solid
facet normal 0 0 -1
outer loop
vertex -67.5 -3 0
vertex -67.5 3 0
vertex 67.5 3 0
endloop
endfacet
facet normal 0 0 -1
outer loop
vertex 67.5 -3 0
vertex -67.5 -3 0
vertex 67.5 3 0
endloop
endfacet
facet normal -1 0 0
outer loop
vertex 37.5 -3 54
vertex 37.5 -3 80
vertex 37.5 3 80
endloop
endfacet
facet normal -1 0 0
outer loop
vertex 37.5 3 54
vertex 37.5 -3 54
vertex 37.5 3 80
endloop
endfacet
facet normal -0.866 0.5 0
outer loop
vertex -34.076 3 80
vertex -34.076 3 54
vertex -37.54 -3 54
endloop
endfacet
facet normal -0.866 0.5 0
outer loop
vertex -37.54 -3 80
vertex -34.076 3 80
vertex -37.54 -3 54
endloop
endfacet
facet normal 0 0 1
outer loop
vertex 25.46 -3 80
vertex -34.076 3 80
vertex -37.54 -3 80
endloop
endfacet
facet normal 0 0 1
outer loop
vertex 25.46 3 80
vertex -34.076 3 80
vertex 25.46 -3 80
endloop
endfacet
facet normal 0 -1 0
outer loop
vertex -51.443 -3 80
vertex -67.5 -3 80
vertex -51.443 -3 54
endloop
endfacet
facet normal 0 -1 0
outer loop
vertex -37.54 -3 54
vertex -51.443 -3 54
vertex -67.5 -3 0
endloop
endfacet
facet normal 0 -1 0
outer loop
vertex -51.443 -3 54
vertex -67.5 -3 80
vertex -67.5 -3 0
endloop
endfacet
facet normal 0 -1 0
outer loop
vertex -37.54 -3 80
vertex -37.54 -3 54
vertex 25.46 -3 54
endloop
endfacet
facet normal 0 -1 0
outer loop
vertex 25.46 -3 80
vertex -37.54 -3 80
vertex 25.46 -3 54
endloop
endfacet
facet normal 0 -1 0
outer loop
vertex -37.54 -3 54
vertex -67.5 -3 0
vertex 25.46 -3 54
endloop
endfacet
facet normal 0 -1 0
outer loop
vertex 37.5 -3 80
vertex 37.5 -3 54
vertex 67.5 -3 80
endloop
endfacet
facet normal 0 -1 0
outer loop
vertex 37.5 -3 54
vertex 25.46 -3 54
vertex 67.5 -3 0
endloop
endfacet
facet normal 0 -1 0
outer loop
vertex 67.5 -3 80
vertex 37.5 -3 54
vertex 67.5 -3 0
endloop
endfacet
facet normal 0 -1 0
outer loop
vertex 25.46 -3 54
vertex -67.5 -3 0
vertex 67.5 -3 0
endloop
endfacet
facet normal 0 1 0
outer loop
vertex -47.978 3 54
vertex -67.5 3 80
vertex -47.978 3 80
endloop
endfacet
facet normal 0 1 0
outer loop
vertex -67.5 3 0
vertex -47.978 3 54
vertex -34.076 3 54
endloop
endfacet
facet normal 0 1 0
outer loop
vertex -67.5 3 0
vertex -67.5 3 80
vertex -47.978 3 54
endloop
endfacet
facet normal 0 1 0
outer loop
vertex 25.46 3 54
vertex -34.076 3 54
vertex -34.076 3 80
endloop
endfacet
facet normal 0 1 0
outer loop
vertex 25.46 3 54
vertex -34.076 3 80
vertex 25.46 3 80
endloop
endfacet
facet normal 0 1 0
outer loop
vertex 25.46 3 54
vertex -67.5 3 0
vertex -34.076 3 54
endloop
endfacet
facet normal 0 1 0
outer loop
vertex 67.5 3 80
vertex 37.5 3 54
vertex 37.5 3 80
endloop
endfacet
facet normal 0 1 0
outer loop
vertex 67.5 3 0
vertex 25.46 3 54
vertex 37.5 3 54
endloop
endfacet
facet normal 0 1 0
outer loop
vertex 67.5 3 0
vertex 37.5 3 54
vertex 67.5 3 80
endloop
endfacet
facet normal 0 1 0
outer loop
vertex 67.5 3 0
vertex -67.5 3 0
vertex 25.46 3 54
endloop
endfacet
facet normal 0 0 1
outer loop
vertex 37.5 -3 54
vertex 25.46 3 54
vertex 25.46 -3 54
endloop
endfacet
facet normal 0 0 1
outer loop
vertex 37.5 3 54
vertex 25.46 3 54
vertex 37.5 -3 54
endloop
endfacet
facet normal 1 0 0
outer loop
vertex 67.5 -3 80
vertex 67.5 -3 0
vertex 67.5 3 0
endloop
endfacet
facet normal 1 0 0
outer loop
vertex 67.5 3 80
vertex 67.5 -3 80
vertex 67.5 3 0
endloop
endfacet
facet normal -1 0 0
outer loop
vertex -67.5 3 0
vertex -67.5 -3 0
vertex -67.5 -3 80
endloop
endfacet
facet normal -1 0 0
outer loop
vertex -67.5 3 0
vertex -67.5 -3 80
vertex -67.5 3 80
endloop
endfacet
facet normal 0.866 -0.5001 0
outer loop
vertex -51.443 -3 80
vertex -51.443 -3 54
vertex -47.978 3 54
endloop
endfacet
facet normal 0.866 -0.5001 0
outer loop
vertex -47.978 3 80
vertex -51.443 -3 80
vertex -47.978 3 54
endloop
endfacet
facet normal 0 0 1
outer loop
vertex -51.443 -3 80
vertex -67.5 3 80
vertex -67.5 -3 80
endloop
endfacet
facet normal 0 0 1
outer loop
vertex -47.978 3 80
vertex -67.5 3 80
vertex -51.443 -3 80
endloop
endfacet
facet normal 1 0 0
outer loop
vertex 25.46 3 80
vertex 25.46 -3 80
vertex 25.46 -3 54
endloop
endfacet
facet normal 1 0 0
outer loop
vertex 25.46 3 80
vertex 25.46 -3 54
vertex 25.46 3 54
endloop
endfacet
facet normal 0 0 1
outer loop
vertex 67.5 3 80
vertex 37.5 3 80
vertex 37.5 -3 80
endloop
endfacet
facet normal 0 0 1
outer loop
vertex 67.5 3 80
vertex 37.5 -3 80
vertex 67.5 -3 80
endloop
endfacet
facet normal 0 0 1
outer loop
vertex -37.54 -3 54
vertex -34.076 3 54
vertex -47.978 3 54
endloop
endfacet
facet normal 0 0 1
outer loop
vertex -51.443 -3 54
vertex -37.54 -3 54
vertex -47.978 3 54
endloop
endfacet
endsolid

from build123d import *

# Parameters (mm, degrees)
SKETCH1_W           = 135
SKETCH1_H           = 6
BOSS_EXTRUDE1_DEPTH = 80
SKETCH2_W           = 12.04
SKETCH2_H           = 6
CUT_EXTRUDE1_DEPTH  = 26


with BuildPart() as part:
    # Sketch1 → Boss-Extrude1 (new body)
    with BuildSketch(Plane.XY):
        Rectangle(SKETCH1_W, SKETCH1_H)
    extrude(amount=BOSS_EXTRUDE1_DEPTH)

    # Sketch2 → Cut-Extrude1 (cut)
    with BuildSketch(Plane.XY.offset(80)):
        with Locations((31.48, 0)):
            Rectangle(SKETCH2_W, SKETCH2_H)
        Polygon((-34.075898385, 3), (-37.54, -3), (-51.442594482, -3), (-47.978492867, 3), align=None)
    extrude(amount=-CUT_EXTRUDE1_DEPTH, mode=Mode.SUBTRACT)


solid = part.part
